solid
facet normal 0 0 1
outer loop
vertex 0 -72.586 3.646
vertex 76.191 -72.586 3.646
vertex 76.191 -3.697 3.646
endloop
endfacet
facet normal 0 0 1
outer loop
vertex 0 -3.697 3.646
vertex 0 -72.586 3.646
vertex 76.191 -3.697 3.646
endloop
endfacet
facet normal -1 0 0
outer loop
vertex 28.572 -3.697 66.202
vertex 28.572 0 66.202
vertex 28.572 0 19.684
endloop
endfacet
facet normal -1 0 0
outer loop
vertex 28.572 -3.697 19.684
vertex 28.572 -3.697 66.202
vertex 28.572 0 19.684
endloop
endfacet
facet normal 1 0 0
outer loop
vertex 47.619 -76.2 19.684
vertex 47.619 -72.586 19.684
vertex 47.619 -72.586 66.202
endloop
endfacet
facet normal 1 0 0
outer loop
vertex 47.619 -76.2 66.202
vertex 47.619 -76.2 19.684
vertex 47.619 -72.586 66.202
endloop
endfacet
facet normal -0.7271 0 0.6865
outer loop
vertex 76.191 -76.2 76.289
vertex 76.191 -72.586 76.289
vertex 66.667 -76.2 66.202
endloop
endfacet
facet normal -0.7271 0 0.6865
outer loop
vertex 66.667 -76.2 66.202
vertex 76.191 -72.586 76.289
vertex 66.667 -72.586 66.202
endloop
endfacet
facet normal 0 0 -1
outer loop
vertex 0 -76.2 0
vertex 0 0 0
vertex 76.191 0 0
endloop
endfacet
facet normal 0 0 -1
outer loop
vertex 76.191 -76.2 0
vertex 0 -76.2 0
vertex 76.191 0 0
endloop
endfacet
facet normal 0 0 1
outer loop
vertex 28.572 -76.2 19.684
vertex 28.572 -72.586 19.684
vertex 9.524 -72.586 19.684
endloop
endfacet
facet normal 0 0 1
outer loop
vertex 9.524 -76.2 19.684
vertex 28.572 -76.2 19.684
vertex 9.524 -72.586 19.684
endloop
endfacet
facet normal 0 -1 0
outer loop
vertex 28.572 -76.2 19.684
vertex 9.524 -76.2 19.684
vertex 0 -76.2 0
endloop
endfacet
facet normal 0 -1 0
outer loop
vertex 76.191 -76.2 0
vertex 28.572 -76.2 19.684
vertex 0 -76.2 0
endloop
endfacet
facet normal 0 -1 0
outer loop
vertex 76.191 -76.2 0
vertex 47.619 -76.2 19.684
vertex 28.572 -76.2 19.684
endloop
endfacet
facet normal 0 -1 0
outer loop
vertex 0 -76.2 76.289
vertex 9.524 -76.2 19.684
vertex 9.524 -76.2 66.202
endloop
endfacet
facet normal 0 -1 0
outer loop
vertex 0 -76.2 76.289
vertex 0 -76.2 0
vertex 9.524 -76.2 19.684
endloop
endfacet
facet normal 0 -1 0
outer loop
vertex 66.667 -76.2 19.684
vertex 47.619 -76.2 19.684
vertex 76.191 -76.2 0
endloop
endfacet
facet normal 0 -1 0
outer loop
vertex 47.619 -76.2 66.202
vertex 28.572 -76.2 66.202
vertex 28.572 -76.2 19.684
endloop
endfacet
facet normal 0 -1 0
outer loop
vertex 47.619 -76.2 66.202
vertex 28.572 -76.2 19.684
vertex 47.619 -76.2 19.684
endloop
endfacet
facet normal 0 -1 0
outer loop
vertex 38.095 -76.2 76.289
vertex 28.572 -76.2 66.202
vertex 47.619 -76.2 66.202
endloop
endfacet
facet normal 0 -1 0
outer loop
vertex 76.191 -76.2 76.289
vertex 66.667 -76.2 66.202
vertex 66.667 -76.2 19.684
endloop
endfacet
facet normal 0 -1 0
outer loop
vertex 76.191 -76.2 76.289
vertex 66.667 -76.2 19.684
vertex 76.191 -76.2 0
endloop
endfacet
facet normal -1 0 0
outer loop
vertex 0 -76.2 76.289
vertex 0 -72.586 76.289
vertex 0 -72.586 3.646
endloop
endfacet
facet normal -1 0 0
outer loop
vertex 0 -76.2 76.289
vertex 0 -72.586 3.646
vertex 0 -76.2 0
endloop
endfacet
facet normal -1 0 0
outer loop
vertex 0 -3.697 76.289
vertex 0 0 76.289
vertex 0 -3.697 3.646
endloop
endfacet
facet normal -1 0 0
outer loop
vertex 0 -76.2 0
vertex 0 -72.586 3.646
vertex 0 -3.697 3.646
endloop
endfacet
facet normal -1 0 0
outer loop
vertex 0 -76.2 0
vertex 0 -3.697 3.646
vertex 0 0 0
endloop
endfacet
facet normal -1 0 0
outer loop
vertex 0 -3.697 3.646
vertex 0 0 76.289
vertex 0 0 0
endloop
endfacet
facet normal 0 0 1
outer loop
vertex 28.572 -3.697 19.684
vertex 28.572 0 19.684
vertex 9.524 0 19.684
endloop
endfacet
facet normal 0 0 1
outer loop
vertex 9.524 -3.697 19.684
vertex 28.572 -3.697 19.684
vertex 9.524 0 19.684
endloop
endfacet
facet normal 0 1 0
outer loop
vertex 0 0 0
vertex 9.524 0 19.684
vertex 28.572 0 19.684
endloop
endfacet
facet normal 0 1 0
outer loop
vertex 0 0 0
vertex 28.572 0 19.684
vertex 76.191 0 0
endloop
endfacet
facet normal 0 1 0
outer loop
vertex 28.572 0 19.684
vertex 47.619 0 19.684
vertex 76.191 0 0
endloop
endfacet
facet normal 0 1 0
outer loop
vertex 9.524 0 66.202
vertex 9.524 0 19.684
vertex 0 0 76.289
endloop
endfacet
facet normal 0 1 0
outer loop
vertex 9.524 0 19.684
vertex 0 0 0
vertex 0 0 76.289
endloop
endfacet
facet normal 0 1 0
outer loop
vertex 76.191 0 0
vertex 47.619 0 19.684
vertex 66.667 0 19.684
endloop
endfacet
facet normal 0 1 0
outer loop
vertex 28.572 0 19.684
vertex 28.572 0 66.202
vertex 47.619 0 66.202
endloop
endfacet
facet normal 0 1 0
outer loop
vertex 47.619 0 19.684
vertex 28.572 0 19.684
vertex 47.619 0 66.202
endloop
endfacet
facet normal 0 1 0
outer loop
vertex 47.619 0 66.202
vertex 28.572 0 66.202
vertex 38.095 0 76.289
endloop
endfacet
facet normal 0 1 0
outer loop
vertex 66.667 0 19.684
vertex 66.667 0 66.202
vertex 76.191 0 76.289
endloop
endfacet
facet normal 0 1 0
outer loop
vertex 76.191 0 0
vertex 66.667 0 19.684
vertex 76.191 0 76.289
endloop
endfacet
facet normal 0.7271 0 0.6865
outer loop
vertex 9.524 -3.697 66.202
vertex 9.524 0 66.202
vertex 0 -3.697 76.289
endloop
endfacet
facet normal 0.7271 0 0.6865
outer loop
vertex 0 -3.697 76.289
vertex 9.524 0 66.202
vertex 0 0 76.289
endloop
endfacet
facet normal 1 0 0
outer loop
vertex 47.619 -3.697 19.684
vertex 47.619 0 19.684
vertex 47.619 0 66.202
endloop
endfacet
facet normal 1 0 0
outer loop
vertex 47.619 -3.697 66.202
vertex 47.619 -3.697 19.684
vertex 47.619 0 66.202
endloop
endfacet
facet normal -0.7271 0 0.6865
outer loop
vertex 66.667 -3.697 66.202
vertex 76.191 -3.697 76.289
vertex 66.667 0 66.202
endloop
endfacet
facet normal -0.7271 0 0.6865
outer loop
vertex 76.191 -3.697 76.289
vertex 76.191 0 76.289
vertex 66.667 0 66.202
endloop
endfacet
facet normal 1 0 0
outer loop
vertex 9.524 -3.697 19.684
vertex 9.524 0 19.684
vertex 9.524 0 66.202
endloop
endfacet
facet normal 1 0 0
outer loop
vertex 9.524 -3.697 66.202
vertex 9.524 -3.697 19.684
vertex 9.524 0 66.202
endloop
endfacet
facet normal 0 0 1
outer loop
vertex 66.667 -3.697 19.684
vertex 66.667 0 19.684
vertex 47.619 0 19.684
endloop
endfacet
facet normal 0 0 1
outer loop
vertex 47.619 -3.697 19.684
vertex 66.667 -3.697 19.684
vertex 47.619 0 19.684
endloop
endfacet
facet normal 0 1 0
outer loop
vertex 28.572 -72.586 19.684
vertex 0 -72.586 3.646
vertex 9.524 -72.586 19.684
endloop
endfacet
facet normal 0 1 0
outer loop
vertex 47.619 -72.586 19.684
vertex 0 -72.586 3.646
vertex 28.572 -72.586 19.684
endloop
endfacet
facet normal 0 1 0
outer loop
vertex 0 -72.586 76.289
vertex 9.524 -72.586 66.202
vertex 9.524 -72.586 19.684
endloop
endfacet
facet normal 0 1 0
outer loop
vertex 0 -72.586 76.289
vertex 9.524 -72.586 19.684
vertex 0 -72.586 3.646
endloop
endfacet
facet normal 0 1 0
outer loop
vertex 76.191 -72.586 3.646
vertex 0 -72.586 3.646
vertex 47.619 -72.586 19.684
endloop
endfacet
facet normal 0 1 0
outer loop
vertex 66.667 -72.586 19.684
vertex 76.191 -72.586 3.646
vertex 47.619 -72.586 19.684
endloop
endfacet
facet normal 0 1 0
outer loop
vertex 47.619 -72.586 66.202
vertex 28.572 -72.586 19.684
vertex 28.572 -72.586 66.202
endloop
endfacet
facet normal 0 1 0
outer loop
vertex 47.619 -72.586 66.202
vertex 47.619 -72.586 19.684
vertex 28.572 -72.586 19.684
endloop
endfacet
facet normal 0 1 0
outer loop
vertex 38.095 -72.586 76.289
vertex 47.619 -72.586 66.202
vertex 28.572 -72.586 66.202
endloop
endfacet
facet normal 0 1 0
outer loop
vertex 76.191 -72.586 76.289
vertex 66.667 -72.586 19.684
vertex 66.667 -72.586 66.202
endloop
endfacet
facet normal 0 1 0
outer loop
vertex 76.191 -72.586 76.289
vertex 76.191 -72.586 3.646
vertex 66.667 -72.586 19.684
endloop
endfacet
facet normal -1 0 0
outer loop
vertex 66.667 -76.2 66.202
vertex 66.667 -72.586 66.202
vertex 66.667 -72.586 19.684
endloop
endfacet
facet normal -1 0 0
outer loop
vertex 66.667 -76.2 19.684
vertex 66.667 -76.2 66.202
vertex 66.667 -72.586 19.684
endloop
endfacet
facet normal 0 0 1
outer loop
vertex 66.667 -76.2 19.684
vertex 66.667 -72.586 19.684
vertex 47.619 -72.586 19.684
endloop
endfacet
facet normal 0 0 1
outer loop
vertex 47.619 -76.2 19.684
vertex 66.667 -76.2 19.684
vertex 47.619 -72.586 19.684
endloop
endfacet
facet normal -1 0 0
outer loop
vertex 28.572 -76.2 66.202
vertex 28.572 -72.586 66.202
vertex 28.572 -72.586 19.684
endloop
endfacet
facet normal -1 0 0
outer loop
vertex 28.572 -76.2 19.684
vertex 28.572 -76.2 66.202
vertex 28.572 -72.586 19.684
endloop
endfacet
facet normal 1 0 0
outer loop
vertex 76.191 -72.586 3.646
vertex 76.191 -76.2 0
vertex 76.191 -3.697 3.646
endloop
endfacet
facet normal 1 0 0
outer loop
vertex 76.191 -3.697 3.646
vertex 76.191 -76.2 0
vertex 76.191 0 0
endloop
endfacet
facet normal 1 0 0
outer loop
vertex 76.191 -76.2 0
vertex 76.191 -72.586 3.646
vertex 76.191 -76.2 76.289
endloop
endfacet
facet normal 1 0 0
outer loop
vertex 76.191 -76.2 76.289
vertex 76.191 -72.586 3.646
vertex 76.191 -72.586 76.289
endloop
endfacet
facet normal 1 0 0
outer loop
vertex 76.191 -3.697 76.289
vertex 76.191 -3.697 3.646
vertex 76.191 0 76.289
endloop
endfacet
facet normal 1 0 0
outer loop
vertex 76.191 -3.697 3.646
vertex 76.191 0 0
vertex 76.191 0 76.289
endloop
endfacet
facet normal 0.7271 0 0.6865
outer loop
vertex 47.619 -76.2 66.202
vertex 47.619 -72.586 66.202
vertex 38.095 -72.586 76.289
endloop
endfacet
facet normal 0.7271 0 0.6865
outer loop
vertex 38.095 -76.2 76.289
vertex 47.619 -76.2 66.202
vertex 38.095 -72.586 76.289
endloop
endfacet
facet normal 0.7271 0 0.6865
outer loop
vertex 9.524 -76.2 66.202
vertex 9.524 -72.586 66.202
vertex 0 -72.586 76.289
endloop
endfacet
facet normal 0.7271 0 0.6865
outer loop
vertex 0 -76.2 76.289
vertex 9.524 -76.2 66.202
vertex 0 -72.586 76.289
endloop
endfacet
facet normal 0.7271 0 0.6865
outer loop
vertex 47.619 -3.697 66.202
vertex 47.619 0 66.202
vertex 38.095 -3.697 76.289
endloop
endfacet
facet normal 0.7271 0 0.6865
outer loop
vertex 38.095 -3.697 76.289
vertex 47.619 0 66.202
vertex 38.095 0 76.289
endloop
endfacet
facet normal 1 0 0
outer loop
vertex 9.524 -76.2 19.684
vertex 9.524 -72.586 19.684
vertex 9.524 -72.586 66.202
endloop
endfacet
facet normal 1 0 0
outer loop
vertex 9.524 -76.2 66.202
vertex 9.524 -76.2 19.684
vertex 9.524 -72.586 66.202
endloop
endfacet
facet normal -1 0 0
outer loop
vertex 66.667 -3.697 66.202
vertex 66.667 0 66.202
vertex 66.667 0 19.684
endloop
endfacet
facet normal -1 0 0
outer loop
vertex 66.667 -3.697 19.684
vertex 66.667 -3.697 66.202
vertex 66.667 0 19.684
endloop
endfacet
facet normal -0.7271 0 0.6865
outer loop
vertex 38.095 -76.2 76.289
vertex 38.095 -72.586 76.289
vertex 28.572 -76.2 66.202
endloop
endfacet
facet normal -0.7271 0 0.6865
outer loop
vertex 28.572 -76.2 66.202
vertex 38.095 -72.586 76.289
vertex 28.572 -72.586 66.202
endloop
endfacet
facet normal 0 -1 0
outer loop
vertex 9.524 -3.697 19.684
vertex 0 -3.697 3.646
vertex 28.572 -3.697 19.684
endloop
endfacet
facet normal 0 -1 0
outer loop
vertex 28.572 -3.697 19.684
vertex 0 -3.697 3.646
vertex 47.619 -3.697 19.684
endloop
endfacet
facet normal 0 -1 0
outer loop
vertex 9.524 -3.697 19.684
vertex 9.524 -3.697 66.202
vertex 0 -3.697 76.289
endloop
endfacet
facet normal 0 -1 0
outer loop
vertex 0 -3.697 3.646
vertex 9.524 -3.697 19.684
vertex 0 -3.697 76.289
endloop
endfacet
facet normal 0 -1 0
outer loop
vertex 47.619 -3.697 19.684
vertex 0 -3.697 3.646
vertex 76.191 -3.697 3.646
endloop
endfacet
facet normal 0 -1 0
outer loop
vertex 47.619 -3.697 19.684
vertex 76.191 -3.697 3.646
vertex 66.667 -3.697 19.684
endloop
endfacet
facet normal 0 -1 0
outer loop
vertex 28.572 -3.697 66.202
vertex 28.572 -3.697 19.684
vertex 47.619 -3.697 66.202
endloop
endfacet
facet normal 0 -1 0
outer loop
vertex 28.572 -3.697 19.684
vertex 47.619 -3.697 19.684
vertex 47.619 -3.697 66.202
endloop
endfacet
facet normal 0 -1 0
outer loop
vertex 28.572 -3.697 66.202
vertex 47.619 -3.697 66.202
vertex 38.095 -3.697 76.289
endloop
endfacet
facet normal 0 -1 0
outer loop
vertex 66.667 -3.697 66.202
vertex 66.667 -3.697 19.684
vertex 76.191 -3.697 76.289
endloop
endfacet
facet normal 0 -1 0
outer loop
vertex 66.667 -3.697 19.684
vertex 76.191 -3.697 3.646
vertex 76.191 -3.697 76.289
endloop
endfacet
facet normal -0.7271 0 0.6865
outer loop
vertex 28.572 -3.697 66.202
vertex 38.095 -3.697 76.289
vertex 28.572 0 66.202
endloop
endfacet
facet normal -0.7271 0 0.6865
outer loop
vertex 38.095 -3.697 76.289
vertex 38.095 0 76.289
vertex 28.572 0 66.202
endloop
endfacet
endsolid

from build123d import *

# Parameters (mm, degrees)
F1_DEPTH = 76.2
F2_W     = 68.889363
F2_H     = 4.894324
F2_H_2   = 72.643043
F3_DEPTH = 88.9


with BuildPart() as f1:
    # F0 (on Front) → F1 (new body)
    with BuildSketch(Plane.XZ):
        Polygon((0, 76.288603), (0, 0), (76.19068, 0), (76.19068, 76.288603), (66.666845, 66.201665), (66.666845, 19.684223), (47.619175, 19.684223), (47.619175, 66.201665), (38.09534, 76.288603), (28.571505, 66.201665), (28.571505, 19.684223), (9.523835, 19.684223), (9.523835, 66.201665), align=None)
    extrude(amount=F1_DEPTH)

    # F2 (on face) → F3 (cut)
    with BuildSketch(Plane.YZ.offset(76.19068)):
        with Locations((-38.141334, 78.735765)):
            Rectangle(F2_W, F2_H)
        with Locations((-38.141334, 39.967081)):
            Rectangle(F2_W, F2_H_2)
    extrude(amount=-F3_DEPTH, mode=Mode.SUBTRACT)


solid = f1.part
